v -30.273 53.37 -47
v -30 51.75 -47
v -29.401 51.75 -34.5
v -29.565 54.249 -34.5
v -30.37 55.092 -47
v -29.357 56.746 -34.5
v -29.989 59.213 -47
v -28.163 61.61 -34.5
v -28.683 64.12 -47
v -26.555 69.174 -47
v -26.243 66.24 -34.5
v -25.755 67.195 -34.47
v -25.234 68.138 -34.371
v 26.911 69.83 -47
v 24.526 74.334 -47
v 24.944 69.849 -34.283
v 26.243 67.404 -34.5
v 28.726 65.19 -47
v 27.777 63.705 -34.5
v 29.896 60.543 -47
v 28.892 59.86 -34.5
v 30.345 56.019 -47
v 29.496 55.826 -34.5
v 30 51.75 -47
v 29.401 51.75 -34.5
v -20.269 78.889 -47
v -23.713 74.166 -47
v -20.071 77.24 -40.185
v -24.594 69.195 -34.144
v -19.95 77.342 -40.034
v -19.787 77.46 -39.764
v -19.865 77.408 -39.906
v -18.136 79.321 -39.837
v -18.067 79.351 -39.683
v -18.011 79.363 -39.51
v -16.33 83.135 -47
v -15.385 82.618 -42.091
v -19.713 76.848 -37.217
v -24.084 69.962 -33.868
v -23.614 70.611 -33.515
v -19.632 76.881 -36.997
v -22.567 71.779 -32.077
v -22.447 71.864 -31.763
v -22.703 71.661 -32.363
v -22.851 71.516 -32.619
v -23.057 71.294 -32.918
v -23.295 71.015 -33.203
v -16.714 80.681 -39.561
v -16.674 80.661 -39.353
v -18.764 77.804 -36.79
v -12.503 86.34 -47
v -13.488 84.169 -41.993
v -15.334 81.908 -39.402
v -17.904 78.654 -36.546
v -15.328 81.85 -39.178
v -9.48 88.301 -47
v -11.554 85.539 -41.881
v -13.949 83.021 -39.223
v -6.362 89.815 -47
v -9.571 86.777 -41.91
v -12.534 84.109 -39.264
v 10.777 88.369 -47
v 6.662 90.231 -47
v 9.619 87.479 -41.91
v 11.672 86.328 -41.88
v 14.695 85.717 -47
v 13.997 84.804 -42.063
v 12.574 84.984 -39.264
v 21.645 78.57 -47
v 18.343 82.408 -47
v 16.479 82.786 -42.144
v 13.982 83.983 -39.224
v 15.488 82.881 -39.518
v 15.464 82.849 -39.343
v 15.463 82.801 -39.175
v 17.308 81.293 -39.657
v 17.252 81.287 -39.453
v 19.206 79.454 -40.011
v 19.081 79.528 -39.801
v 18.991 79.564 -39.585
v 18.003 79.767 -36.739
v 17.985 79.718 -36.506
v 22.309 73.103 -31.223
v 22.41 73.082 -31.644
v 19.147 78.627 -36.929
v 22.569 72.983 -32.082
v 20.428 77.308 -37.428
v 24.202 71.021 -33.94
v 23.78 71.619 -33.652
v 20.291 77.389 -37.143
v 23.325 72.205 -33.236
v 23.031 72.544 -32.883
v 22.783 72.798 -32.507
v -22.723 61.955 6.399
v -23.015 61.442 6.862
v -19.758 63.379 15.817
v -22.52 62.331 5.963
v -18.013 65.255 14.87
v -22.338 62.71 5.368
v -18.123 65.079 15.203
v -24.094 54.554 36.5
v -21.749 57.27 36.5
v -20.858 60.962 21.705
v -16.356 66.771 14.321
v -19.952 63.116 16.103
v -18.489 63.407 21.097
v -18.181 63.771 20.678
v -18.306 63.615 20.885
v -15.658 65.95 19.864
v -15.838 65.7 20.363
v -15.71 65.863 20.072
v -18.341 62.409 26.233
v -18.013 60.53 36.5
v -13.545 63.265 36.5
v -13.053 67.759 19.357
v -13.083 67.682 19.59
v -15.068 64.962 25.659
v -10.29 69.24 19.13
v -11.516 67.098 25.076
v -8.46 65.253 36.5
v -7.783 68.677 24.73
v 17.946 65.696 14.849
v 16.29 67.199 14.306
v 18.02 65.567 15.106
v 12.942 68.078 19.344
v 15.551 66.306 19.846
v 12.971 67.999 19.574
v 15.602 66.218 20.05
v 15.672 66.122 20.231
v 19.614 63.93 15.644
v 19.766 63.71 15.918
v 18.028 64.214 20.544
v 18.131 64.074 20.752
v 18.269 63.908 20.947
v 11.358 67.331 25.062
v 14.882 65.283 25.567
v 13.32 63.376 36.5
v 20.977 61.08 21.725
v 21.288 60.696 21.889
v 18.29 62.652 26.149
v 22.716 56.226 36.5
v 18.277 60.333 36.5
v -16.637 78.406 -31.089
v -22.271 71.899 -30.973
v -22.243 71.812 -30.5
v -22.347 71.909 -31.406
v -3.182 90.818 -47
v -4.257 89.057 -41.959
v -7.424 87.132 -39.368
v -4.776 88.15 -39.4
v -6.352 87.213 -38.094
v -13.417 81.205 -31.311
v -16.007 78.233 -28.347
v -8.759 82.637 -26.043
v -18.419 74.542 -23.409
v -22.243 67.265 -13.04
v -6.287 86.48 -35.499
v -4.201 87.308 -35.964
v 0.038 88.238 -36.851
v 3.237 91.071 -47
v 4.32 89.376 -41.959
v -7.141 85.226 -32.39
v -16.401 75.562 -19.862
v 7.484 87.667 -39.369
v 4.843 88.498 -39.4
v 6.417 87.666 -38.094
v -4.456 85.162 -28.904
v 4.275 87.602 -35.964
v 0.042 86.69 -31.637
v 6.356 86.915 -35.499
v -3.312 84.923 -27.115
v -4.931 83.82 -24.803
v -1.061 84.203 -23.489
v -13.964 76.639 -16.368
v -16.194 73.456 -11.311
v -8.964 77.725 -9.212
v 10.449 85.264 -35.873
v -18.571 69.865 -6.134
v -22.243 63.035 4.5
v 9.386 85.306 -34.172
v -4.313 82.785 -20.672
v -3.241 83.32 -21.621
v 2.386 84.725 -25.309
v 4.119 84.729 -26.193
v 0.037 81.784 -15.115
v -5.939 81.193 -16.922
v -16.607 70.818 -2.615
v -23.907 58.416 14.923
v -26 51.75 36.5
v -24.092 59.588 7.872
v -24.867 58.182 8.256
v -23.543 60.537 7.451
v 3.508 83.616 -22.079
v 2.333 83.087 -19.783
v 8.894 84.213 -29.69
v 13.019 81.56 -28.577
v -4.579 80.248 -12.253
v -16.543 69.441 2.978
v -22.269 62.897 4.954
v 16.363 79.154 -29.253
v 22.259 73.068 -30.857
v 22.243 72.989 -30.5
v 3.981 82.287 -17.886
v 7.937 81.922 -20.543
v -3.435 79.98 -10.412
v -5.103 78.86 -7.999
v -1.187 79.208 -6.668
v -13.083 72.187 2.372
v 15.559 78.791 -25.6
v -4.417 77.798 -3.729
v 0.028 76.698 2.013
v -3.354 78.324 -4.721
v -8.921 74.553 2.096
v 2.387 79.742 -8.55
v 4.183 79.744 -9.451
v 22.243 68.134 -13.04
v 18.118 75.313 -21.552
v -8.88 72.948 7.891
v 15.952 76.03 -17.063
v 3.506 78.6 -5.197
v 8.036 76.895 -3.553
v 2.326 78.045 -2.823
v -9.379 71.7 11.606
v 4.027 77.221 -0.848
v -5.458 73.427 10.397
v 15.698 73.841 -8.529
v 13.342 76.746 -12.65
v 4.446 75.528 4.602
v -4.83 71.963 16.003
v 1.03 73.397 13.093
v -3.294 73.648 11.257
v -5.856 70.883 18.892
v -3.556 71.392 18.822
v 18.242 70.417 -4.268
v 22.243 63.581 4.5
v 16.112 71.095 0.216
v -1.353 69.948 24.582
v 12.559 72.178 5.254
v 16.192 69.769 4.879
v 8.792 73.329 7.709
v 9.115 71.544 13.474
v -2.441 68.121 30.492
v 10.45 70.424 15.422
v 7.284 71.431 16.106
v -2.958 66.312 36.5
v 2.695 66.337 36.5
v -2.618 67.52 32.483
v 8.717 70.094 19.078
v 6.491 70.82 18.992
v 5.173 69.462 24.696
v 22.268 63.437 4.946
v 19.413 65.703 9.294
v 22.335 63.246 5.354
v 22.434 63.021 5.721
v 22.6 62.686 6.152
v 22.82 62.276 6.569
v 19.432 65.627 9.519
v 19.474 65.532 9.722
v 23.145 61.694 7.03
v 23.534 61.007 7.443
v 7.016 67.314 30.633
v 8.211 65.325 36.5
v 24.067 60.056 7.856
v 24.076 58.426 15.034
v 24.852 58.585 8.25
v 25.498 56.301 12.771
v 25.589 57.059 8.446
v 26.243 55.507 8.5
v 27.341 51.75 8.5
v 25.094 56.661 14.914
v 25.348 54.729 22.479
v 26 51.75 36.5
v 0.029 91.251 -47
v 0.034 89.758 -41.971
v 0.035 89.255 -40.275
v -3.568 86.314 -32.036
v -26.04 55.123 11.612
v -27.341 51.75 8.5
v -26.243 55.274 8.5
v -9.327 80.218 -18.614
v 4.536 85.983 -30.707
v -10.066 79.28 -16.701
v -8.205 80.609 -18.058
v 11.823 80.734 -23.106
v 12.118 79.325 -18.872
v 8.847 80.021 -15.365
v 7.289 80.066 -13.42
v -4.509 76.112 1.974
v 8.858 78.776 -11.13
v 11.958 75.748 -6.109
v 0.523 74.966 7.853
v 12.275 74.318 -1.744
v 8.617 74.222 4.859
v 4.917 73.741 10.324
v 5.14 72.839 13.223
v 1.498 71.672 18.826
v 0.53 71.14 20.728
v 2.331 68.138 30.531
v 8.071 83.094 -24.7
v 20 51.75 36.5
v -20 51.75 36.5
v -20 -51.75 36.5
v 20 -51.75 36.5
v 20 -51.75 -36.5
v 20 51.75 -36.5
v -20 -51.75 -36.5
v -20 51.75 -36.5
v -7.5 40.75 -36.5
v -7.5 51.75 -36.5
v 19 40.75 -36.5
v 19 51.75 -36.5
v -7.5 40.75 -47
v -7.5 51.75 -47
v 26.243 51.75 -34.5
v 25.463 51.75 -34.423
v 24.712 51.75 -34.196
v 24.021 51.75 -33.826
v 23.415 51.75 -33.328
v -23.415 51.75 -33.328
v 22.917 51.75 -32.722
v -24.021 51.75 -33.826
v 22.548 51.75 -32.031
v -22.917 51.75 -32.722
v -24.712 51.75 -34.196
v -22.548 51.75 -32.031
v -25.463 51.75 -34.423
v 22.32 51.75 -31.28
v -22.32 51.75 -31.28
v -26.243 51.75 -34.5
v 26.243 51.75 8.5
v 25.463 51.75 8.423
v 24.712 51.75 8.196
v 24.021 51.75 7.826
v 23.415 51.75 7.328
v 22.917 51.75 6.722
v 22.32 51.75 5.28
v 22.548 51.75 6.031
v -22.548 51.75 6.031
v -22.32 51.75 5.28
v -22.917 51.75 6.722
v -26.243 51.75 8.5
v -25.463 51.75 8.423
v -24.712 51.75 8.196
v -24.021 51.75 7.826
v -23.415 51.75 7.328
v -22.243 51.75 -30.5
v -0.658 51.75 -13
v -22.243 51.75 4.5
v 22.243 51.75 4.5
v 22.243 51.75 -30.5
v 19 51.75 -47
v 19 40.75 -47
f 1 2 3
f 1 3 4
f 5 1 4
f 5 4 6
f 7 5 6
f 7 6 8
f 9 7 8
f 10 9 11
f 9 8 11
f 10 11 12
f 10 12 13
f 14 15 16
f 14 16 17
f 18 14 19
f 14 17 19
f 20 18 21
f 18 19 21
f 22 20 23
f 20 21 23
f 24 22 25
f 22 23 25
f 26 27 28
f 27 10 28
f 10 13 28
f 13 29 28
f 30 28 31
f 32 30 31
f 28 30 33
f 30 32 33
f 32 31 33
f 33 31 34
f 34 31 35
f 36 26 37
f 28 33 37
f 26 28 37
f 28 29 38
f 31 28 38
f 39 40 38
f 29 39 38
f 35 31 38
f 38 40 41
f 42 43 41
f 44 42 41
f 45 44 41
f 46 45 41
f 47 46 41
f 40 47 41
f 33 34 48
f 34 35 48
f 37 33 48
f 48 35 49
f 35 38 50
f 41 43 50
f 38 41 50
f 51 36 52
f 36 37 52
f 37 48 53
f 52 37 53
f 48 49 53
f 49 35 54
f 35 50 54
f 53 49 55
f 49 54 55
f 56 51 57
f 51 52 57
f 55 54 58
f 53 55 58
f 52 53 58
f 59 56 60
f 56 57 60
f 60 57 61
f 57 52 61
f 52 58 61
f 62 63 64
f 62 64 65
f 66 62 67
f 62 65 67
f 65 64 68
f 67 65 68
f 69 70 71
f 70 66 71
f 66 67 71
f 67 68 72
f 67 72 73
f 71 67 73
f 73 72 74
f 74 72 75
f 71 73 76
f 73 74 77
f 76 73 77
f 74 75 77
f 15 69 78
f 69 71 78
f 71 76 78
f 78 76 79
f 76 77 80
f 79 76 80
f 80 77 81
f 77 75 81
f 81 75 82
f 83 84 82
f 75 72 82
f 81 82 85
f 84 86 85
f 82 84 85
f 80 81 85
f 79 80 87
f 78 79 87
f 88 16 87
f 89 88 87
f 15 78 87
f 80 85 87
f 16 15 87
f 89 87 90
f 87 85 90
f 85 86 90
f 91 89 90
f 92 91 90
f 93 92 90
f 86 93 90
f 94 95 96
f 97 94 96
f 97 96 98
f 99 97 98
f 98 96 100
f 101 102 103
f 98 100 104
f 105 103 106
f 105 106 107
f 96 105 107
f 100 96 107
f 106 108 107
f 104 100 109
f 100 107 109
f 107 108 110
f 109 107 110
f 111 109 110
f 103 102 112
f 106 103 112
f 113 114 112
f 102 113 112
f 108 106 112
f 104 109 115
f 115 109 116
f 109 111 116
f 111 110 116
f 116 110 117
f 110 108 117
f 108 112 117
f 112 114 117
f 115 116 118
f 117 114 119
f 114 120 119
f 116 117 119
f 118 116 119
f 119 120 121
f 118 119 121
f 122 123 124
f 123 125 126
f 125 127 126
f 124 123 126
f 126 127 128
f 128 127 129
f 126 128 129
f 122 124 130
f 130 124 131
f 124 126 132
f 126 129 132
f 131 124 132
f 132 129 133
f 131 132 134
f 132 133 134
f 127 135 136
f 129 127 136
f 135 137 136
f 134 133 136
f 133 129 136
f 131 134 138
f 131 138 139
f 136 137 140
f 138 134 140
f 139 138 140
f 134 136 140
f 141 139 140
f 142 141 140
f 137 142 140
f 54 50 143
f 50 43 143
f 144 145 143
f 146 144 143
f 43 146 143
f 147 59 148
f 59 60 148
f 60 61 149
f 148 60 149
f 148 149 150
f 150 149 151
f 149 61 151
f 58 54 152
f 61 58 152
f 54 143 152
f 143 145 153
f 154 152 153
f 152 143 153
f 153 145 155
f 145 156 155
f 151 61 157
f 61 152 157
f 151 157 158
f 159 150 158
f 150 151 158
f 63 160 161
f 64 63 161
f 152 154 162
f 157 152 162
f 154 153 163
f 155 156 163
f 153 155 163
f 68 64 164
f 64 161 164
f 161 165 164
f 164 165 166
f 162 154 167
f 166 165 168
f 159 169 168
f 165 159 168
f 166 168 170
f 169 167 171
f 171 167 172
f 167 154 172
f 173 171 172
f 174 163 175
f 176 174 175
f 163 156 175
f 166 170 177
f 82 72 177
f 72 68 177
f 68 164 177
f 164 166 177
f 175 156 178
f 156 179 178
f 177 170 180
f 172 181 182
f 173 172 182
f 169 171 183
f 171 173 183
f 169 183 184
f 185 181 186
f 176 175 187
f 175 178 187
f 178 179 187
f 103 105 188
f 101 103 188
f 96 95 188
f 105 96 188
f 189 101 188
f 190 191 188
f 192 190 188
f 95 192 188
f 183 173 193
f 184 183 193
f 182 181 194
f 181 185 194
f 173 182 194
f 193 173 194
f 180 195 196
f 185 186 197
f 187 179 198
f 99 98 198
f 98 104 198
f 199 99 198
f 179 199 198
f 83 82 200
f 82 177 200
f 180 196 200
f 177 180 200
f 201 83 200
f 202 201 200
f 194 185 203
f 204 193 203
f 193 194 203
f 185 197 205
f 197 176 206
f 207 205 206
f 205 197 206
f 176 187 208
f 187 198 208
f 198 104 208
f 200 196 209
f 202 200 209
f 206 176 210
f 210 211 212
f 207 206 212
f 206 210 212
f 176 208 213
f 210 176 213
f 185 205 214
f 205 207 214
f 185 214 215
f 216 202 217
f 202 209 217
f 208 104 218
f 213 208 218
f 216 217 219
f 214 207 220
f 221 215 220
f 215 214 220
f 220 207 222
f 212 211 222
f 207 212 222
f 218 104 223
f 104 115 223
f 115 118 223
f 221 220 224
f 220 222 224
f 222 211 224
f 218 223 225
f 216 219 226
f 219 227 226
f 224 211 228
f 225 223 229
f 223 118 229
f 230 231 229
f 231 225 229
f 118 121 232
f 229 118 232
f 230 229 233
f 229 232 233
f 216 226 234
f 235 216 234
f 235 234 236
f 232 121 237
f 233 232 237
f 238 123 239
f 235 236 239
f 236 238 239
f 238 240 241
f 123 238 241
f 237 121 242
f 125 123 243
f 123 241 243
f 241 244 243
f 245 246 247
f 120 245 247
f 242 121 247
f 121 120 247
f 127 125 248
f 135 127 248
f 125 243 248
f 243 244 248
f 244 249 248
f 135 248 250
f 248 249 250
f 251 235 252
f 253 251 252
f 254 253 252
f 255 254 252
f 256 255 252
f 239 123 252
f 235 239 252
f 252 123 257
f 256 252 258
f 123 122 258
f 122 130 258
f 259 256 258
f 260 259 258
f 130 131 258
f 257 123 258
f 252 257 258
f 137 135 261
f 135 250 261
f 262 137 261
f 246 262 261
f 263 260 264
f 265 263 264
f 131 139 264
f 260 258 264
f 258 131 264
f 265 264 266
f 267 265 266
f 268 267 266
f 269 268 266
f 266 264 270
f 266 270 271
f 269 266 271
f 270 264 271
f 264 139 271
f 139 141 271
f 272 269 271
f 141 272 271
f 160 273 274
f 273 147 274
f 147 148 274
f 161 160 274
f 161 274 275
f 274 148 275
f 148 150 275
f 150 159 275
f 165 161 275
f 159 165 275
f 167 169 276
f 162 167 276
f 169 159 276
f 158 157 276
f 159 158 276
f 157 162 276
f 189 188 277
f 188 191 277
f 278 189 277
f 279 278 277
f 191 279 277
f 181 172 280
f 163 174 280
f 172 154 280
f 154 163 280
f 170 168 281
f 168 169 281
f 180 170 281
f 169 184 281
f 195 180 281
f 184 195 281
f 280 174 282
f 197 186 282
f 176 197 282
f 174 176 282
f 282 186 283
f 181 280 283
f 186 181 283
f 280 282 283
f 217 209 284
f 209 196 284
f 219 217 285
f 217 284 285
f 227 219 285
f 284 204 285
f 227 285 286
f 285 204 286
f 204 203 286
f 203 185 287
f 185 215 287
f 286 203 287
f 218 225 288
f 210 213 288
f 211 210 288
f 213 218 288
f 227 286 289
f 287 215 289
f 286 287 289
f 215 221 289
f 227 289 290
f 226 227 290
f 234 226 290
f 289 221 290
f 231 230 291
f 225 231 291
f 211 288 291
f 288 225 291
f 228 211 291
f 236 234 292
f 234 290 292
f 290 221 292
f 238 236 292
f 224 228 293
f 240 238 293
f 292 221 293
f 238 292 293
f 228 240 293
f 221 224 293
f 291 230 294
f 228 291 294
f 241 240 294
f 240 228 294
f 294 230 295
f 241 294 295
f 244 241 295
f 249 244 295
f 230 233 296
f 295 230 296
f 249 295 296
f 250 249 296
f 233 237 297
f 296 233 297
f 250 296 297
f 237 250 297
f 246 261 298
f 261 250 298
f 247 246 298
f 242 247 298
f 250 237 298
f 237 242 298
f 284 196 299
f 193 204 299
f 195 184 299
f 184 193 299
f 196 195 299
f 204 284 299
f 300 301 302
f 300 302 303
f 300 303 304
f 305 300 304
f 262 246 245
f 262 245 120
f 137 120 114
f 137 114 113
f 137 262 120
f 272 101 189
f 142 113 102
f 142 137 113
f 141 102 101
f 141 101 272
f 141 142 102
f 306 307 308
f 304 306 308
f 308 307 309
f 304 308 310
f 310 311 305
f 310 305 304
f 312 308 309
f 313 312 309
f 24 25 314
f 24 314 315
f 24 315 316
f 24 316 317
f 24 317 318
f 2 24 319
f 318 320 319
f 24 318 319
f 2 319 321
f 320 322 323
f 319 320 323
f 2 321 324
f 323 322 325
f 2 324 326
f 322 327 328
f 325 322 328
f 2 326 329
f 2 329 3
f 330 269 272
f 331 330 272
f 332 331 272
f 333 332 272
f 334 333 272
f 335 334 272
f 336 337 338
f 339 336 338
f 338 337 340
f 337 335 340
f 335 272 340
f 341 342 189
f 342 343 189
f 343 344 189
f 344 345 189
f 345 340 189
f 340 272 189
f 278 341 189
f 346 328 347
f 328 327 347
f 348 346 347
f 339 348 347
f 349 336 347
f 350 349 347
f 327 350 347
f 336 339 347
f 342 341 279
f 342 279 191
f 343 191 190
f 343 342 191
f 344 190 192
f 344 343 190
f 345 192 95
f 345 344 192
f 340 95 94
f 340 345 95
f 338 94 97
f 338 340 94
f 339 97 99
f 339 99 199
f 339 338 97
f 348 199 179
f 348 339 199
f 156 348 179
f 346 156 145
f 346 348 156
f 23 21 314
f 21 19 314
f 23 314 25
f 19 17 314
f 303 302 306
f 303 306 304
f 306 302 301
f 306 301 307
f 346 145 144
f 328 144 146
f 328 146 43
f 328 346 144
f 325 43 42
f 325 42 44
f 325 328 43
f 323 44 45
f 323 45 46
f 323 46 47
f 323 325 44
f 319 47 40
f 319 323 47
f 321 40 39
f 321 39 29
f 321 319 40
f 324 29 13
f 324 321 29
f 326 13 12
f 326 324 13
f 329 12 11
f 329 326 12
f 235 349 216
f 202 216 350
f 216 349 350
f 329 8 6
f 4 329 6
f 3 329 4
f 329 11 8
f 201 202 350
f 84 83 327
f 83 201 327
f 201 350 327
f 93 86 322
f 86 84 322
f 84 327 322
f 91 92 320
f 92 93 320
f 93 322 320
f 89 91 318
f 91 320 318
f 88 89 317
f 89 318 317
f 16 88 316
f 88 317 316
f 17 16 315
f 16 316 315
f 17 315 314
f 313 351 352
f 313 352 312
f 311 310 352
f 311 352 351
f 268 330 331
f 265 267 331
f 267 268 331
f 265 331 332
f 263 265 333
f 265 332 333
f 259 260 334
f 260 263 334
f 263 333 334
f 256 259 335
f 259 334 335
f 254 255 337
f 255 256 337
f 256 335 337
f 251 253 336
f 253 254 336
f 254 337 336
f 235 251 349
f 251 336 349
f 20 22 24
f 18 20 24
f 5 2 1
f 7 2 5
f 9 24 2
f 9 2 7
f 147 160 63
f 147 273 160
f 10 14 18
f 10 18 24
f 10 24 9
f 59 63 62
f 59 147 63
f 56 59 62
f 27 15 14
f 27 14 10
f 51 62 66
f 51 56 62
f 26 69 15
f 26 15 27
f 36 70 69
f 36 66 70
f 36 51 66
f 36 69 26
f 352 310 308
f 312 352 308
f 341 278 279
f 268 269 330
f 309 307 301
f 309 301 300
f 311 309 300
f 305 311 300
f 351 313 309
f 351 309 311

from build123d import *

# Parameters (mm, degrees)
SKETCH_1_W          = 40
SKETCH_1_H          = 73
EXTRUDE_1_DEPTH     = 51.75
SKETCH_2_W          = 26.5
SKETCH_2_H          = 11
EXTRUDE_2_DEPTH     = 10.5
CUT_EXTRUDE_1_DEPTH = 118.658825115


with BuildPart() as part:
    # 草图1 → 凸台-拉伸1 (new, symmetric)
    with BuildSketch(Plane(origin=(0, 0, 0), x_dir=(1, 0, 0), z_dir=(0, 1, 0))):
        Rectangle(SKETCH_1_W, SKETCH_1_H)
    extrude(amount=EXTRUDE_1_DEPTH, both=True)

    # 草图2 → 凸台-拉伸2 (add)
    with BuildSketch(Plane(origin=(0, 0, -36.5), x_dir=(-1, 0, 0), z_dir=(0, 0, -1))):
        with Locations((-5.75, 46.25)):
            Rectangle(SKETCH_2_W, SKETCH_2_H)
    extrude(amount=EXTRUDE_2_DEPTH)


with BuildPart() as body_2:
    # 草图3 → 放样1 section 0
    with BuildSketch(Plane(origin=(0, 0, -47), x_dir=(-1, 0, 0), z_dir=(0, 0, -1))):
        with BuildLine():
            Line((-30, 51.75), (30, 51.75))
            add(Edge.make_bspline(
                [(-30, 51.75), (-32.960840364, 67.552970125), (-0.122307099, 116.257852524), (33.072086404, 64.936710937), (30, 51.75)],
                knots=[0, 0, 0, 0, 0.500504929, 1, 1, 1, 1], degree=3))
        make_face()
    # 草图4 for 放样1 → 放样1 section 1
    with BuildSketch(Plane.XY.offset(36.5)):
        with BuildLine():
            Line((-26, 51.75), (26, 51.75))
            # circular arc as an exact rational Bezier (weights 1, cos(half-angle), 1)
            Bezier((26, 51.75), (0, 95.0040341), (-26, 51.75), weights=[1, 0.515188813, 1])
        make_face()
    loft()

    # 草图5 → 切除-拉伸1 (cut, through all)
    with BuildSketch(Plane.XZ.offset(-51.75)):
        with BuildLine():
            Line((-27.341317365, 8.5), (-26.243023445, 8.5))
            ThreePointArc((-26.243023445, 8.5), (-23.41459632, 7.328427125), (-22.243023445, 4.5))
            Line((-22.243023445, 4.5), (-22.243023445, -30.5))
            ThreePointArc((-22.243023445, -30.5), (-23.41459632, -33.328427125), (-26.243023445, -34.5))
            Line((-26.243023445, -34.5), (-29.401197605, -34.5))
            Line((-29.401197605, -34.5), (-36.989276173, -34.5))
            Line((-36.989276173, -34.5), (-36.989276173, 9.347472548))
            Line((-36.989276173, 9.347472548), (-27.341317365, 8.5))
        make_face()
        with BuildLine():
            Line((36.989276173, 9.347472548), (27.341317365, 8.5))
            Line((27.341317365, 8.5), (26.243023445, 8.5))
            ThreePointArc((26.243023445, 8.5), (23.41459632, 7.328427125), (22.243023445, 4.5))
            Line((22.243023445, 4.5), (22.243023445, -30.5))
            ThreePointArc((22.243023445, -30.5), (23.41459632, -33.328427125), (26.243023445, -34.5))
            Line((26.243023445, -34.5), (29.401197605, -34.5))
            Line((29.401197605, -34.5), (36.989276173, -34.5))
            Line((36.989276173, -34.5), (36.989276173, 9.347472548))
        make_face()
    extrude(amount=-CUT_EXTRUDE_1_DEPTH, mode=Mode.SUBTRACT)


solid = Compound([part.part, body_2.part])
